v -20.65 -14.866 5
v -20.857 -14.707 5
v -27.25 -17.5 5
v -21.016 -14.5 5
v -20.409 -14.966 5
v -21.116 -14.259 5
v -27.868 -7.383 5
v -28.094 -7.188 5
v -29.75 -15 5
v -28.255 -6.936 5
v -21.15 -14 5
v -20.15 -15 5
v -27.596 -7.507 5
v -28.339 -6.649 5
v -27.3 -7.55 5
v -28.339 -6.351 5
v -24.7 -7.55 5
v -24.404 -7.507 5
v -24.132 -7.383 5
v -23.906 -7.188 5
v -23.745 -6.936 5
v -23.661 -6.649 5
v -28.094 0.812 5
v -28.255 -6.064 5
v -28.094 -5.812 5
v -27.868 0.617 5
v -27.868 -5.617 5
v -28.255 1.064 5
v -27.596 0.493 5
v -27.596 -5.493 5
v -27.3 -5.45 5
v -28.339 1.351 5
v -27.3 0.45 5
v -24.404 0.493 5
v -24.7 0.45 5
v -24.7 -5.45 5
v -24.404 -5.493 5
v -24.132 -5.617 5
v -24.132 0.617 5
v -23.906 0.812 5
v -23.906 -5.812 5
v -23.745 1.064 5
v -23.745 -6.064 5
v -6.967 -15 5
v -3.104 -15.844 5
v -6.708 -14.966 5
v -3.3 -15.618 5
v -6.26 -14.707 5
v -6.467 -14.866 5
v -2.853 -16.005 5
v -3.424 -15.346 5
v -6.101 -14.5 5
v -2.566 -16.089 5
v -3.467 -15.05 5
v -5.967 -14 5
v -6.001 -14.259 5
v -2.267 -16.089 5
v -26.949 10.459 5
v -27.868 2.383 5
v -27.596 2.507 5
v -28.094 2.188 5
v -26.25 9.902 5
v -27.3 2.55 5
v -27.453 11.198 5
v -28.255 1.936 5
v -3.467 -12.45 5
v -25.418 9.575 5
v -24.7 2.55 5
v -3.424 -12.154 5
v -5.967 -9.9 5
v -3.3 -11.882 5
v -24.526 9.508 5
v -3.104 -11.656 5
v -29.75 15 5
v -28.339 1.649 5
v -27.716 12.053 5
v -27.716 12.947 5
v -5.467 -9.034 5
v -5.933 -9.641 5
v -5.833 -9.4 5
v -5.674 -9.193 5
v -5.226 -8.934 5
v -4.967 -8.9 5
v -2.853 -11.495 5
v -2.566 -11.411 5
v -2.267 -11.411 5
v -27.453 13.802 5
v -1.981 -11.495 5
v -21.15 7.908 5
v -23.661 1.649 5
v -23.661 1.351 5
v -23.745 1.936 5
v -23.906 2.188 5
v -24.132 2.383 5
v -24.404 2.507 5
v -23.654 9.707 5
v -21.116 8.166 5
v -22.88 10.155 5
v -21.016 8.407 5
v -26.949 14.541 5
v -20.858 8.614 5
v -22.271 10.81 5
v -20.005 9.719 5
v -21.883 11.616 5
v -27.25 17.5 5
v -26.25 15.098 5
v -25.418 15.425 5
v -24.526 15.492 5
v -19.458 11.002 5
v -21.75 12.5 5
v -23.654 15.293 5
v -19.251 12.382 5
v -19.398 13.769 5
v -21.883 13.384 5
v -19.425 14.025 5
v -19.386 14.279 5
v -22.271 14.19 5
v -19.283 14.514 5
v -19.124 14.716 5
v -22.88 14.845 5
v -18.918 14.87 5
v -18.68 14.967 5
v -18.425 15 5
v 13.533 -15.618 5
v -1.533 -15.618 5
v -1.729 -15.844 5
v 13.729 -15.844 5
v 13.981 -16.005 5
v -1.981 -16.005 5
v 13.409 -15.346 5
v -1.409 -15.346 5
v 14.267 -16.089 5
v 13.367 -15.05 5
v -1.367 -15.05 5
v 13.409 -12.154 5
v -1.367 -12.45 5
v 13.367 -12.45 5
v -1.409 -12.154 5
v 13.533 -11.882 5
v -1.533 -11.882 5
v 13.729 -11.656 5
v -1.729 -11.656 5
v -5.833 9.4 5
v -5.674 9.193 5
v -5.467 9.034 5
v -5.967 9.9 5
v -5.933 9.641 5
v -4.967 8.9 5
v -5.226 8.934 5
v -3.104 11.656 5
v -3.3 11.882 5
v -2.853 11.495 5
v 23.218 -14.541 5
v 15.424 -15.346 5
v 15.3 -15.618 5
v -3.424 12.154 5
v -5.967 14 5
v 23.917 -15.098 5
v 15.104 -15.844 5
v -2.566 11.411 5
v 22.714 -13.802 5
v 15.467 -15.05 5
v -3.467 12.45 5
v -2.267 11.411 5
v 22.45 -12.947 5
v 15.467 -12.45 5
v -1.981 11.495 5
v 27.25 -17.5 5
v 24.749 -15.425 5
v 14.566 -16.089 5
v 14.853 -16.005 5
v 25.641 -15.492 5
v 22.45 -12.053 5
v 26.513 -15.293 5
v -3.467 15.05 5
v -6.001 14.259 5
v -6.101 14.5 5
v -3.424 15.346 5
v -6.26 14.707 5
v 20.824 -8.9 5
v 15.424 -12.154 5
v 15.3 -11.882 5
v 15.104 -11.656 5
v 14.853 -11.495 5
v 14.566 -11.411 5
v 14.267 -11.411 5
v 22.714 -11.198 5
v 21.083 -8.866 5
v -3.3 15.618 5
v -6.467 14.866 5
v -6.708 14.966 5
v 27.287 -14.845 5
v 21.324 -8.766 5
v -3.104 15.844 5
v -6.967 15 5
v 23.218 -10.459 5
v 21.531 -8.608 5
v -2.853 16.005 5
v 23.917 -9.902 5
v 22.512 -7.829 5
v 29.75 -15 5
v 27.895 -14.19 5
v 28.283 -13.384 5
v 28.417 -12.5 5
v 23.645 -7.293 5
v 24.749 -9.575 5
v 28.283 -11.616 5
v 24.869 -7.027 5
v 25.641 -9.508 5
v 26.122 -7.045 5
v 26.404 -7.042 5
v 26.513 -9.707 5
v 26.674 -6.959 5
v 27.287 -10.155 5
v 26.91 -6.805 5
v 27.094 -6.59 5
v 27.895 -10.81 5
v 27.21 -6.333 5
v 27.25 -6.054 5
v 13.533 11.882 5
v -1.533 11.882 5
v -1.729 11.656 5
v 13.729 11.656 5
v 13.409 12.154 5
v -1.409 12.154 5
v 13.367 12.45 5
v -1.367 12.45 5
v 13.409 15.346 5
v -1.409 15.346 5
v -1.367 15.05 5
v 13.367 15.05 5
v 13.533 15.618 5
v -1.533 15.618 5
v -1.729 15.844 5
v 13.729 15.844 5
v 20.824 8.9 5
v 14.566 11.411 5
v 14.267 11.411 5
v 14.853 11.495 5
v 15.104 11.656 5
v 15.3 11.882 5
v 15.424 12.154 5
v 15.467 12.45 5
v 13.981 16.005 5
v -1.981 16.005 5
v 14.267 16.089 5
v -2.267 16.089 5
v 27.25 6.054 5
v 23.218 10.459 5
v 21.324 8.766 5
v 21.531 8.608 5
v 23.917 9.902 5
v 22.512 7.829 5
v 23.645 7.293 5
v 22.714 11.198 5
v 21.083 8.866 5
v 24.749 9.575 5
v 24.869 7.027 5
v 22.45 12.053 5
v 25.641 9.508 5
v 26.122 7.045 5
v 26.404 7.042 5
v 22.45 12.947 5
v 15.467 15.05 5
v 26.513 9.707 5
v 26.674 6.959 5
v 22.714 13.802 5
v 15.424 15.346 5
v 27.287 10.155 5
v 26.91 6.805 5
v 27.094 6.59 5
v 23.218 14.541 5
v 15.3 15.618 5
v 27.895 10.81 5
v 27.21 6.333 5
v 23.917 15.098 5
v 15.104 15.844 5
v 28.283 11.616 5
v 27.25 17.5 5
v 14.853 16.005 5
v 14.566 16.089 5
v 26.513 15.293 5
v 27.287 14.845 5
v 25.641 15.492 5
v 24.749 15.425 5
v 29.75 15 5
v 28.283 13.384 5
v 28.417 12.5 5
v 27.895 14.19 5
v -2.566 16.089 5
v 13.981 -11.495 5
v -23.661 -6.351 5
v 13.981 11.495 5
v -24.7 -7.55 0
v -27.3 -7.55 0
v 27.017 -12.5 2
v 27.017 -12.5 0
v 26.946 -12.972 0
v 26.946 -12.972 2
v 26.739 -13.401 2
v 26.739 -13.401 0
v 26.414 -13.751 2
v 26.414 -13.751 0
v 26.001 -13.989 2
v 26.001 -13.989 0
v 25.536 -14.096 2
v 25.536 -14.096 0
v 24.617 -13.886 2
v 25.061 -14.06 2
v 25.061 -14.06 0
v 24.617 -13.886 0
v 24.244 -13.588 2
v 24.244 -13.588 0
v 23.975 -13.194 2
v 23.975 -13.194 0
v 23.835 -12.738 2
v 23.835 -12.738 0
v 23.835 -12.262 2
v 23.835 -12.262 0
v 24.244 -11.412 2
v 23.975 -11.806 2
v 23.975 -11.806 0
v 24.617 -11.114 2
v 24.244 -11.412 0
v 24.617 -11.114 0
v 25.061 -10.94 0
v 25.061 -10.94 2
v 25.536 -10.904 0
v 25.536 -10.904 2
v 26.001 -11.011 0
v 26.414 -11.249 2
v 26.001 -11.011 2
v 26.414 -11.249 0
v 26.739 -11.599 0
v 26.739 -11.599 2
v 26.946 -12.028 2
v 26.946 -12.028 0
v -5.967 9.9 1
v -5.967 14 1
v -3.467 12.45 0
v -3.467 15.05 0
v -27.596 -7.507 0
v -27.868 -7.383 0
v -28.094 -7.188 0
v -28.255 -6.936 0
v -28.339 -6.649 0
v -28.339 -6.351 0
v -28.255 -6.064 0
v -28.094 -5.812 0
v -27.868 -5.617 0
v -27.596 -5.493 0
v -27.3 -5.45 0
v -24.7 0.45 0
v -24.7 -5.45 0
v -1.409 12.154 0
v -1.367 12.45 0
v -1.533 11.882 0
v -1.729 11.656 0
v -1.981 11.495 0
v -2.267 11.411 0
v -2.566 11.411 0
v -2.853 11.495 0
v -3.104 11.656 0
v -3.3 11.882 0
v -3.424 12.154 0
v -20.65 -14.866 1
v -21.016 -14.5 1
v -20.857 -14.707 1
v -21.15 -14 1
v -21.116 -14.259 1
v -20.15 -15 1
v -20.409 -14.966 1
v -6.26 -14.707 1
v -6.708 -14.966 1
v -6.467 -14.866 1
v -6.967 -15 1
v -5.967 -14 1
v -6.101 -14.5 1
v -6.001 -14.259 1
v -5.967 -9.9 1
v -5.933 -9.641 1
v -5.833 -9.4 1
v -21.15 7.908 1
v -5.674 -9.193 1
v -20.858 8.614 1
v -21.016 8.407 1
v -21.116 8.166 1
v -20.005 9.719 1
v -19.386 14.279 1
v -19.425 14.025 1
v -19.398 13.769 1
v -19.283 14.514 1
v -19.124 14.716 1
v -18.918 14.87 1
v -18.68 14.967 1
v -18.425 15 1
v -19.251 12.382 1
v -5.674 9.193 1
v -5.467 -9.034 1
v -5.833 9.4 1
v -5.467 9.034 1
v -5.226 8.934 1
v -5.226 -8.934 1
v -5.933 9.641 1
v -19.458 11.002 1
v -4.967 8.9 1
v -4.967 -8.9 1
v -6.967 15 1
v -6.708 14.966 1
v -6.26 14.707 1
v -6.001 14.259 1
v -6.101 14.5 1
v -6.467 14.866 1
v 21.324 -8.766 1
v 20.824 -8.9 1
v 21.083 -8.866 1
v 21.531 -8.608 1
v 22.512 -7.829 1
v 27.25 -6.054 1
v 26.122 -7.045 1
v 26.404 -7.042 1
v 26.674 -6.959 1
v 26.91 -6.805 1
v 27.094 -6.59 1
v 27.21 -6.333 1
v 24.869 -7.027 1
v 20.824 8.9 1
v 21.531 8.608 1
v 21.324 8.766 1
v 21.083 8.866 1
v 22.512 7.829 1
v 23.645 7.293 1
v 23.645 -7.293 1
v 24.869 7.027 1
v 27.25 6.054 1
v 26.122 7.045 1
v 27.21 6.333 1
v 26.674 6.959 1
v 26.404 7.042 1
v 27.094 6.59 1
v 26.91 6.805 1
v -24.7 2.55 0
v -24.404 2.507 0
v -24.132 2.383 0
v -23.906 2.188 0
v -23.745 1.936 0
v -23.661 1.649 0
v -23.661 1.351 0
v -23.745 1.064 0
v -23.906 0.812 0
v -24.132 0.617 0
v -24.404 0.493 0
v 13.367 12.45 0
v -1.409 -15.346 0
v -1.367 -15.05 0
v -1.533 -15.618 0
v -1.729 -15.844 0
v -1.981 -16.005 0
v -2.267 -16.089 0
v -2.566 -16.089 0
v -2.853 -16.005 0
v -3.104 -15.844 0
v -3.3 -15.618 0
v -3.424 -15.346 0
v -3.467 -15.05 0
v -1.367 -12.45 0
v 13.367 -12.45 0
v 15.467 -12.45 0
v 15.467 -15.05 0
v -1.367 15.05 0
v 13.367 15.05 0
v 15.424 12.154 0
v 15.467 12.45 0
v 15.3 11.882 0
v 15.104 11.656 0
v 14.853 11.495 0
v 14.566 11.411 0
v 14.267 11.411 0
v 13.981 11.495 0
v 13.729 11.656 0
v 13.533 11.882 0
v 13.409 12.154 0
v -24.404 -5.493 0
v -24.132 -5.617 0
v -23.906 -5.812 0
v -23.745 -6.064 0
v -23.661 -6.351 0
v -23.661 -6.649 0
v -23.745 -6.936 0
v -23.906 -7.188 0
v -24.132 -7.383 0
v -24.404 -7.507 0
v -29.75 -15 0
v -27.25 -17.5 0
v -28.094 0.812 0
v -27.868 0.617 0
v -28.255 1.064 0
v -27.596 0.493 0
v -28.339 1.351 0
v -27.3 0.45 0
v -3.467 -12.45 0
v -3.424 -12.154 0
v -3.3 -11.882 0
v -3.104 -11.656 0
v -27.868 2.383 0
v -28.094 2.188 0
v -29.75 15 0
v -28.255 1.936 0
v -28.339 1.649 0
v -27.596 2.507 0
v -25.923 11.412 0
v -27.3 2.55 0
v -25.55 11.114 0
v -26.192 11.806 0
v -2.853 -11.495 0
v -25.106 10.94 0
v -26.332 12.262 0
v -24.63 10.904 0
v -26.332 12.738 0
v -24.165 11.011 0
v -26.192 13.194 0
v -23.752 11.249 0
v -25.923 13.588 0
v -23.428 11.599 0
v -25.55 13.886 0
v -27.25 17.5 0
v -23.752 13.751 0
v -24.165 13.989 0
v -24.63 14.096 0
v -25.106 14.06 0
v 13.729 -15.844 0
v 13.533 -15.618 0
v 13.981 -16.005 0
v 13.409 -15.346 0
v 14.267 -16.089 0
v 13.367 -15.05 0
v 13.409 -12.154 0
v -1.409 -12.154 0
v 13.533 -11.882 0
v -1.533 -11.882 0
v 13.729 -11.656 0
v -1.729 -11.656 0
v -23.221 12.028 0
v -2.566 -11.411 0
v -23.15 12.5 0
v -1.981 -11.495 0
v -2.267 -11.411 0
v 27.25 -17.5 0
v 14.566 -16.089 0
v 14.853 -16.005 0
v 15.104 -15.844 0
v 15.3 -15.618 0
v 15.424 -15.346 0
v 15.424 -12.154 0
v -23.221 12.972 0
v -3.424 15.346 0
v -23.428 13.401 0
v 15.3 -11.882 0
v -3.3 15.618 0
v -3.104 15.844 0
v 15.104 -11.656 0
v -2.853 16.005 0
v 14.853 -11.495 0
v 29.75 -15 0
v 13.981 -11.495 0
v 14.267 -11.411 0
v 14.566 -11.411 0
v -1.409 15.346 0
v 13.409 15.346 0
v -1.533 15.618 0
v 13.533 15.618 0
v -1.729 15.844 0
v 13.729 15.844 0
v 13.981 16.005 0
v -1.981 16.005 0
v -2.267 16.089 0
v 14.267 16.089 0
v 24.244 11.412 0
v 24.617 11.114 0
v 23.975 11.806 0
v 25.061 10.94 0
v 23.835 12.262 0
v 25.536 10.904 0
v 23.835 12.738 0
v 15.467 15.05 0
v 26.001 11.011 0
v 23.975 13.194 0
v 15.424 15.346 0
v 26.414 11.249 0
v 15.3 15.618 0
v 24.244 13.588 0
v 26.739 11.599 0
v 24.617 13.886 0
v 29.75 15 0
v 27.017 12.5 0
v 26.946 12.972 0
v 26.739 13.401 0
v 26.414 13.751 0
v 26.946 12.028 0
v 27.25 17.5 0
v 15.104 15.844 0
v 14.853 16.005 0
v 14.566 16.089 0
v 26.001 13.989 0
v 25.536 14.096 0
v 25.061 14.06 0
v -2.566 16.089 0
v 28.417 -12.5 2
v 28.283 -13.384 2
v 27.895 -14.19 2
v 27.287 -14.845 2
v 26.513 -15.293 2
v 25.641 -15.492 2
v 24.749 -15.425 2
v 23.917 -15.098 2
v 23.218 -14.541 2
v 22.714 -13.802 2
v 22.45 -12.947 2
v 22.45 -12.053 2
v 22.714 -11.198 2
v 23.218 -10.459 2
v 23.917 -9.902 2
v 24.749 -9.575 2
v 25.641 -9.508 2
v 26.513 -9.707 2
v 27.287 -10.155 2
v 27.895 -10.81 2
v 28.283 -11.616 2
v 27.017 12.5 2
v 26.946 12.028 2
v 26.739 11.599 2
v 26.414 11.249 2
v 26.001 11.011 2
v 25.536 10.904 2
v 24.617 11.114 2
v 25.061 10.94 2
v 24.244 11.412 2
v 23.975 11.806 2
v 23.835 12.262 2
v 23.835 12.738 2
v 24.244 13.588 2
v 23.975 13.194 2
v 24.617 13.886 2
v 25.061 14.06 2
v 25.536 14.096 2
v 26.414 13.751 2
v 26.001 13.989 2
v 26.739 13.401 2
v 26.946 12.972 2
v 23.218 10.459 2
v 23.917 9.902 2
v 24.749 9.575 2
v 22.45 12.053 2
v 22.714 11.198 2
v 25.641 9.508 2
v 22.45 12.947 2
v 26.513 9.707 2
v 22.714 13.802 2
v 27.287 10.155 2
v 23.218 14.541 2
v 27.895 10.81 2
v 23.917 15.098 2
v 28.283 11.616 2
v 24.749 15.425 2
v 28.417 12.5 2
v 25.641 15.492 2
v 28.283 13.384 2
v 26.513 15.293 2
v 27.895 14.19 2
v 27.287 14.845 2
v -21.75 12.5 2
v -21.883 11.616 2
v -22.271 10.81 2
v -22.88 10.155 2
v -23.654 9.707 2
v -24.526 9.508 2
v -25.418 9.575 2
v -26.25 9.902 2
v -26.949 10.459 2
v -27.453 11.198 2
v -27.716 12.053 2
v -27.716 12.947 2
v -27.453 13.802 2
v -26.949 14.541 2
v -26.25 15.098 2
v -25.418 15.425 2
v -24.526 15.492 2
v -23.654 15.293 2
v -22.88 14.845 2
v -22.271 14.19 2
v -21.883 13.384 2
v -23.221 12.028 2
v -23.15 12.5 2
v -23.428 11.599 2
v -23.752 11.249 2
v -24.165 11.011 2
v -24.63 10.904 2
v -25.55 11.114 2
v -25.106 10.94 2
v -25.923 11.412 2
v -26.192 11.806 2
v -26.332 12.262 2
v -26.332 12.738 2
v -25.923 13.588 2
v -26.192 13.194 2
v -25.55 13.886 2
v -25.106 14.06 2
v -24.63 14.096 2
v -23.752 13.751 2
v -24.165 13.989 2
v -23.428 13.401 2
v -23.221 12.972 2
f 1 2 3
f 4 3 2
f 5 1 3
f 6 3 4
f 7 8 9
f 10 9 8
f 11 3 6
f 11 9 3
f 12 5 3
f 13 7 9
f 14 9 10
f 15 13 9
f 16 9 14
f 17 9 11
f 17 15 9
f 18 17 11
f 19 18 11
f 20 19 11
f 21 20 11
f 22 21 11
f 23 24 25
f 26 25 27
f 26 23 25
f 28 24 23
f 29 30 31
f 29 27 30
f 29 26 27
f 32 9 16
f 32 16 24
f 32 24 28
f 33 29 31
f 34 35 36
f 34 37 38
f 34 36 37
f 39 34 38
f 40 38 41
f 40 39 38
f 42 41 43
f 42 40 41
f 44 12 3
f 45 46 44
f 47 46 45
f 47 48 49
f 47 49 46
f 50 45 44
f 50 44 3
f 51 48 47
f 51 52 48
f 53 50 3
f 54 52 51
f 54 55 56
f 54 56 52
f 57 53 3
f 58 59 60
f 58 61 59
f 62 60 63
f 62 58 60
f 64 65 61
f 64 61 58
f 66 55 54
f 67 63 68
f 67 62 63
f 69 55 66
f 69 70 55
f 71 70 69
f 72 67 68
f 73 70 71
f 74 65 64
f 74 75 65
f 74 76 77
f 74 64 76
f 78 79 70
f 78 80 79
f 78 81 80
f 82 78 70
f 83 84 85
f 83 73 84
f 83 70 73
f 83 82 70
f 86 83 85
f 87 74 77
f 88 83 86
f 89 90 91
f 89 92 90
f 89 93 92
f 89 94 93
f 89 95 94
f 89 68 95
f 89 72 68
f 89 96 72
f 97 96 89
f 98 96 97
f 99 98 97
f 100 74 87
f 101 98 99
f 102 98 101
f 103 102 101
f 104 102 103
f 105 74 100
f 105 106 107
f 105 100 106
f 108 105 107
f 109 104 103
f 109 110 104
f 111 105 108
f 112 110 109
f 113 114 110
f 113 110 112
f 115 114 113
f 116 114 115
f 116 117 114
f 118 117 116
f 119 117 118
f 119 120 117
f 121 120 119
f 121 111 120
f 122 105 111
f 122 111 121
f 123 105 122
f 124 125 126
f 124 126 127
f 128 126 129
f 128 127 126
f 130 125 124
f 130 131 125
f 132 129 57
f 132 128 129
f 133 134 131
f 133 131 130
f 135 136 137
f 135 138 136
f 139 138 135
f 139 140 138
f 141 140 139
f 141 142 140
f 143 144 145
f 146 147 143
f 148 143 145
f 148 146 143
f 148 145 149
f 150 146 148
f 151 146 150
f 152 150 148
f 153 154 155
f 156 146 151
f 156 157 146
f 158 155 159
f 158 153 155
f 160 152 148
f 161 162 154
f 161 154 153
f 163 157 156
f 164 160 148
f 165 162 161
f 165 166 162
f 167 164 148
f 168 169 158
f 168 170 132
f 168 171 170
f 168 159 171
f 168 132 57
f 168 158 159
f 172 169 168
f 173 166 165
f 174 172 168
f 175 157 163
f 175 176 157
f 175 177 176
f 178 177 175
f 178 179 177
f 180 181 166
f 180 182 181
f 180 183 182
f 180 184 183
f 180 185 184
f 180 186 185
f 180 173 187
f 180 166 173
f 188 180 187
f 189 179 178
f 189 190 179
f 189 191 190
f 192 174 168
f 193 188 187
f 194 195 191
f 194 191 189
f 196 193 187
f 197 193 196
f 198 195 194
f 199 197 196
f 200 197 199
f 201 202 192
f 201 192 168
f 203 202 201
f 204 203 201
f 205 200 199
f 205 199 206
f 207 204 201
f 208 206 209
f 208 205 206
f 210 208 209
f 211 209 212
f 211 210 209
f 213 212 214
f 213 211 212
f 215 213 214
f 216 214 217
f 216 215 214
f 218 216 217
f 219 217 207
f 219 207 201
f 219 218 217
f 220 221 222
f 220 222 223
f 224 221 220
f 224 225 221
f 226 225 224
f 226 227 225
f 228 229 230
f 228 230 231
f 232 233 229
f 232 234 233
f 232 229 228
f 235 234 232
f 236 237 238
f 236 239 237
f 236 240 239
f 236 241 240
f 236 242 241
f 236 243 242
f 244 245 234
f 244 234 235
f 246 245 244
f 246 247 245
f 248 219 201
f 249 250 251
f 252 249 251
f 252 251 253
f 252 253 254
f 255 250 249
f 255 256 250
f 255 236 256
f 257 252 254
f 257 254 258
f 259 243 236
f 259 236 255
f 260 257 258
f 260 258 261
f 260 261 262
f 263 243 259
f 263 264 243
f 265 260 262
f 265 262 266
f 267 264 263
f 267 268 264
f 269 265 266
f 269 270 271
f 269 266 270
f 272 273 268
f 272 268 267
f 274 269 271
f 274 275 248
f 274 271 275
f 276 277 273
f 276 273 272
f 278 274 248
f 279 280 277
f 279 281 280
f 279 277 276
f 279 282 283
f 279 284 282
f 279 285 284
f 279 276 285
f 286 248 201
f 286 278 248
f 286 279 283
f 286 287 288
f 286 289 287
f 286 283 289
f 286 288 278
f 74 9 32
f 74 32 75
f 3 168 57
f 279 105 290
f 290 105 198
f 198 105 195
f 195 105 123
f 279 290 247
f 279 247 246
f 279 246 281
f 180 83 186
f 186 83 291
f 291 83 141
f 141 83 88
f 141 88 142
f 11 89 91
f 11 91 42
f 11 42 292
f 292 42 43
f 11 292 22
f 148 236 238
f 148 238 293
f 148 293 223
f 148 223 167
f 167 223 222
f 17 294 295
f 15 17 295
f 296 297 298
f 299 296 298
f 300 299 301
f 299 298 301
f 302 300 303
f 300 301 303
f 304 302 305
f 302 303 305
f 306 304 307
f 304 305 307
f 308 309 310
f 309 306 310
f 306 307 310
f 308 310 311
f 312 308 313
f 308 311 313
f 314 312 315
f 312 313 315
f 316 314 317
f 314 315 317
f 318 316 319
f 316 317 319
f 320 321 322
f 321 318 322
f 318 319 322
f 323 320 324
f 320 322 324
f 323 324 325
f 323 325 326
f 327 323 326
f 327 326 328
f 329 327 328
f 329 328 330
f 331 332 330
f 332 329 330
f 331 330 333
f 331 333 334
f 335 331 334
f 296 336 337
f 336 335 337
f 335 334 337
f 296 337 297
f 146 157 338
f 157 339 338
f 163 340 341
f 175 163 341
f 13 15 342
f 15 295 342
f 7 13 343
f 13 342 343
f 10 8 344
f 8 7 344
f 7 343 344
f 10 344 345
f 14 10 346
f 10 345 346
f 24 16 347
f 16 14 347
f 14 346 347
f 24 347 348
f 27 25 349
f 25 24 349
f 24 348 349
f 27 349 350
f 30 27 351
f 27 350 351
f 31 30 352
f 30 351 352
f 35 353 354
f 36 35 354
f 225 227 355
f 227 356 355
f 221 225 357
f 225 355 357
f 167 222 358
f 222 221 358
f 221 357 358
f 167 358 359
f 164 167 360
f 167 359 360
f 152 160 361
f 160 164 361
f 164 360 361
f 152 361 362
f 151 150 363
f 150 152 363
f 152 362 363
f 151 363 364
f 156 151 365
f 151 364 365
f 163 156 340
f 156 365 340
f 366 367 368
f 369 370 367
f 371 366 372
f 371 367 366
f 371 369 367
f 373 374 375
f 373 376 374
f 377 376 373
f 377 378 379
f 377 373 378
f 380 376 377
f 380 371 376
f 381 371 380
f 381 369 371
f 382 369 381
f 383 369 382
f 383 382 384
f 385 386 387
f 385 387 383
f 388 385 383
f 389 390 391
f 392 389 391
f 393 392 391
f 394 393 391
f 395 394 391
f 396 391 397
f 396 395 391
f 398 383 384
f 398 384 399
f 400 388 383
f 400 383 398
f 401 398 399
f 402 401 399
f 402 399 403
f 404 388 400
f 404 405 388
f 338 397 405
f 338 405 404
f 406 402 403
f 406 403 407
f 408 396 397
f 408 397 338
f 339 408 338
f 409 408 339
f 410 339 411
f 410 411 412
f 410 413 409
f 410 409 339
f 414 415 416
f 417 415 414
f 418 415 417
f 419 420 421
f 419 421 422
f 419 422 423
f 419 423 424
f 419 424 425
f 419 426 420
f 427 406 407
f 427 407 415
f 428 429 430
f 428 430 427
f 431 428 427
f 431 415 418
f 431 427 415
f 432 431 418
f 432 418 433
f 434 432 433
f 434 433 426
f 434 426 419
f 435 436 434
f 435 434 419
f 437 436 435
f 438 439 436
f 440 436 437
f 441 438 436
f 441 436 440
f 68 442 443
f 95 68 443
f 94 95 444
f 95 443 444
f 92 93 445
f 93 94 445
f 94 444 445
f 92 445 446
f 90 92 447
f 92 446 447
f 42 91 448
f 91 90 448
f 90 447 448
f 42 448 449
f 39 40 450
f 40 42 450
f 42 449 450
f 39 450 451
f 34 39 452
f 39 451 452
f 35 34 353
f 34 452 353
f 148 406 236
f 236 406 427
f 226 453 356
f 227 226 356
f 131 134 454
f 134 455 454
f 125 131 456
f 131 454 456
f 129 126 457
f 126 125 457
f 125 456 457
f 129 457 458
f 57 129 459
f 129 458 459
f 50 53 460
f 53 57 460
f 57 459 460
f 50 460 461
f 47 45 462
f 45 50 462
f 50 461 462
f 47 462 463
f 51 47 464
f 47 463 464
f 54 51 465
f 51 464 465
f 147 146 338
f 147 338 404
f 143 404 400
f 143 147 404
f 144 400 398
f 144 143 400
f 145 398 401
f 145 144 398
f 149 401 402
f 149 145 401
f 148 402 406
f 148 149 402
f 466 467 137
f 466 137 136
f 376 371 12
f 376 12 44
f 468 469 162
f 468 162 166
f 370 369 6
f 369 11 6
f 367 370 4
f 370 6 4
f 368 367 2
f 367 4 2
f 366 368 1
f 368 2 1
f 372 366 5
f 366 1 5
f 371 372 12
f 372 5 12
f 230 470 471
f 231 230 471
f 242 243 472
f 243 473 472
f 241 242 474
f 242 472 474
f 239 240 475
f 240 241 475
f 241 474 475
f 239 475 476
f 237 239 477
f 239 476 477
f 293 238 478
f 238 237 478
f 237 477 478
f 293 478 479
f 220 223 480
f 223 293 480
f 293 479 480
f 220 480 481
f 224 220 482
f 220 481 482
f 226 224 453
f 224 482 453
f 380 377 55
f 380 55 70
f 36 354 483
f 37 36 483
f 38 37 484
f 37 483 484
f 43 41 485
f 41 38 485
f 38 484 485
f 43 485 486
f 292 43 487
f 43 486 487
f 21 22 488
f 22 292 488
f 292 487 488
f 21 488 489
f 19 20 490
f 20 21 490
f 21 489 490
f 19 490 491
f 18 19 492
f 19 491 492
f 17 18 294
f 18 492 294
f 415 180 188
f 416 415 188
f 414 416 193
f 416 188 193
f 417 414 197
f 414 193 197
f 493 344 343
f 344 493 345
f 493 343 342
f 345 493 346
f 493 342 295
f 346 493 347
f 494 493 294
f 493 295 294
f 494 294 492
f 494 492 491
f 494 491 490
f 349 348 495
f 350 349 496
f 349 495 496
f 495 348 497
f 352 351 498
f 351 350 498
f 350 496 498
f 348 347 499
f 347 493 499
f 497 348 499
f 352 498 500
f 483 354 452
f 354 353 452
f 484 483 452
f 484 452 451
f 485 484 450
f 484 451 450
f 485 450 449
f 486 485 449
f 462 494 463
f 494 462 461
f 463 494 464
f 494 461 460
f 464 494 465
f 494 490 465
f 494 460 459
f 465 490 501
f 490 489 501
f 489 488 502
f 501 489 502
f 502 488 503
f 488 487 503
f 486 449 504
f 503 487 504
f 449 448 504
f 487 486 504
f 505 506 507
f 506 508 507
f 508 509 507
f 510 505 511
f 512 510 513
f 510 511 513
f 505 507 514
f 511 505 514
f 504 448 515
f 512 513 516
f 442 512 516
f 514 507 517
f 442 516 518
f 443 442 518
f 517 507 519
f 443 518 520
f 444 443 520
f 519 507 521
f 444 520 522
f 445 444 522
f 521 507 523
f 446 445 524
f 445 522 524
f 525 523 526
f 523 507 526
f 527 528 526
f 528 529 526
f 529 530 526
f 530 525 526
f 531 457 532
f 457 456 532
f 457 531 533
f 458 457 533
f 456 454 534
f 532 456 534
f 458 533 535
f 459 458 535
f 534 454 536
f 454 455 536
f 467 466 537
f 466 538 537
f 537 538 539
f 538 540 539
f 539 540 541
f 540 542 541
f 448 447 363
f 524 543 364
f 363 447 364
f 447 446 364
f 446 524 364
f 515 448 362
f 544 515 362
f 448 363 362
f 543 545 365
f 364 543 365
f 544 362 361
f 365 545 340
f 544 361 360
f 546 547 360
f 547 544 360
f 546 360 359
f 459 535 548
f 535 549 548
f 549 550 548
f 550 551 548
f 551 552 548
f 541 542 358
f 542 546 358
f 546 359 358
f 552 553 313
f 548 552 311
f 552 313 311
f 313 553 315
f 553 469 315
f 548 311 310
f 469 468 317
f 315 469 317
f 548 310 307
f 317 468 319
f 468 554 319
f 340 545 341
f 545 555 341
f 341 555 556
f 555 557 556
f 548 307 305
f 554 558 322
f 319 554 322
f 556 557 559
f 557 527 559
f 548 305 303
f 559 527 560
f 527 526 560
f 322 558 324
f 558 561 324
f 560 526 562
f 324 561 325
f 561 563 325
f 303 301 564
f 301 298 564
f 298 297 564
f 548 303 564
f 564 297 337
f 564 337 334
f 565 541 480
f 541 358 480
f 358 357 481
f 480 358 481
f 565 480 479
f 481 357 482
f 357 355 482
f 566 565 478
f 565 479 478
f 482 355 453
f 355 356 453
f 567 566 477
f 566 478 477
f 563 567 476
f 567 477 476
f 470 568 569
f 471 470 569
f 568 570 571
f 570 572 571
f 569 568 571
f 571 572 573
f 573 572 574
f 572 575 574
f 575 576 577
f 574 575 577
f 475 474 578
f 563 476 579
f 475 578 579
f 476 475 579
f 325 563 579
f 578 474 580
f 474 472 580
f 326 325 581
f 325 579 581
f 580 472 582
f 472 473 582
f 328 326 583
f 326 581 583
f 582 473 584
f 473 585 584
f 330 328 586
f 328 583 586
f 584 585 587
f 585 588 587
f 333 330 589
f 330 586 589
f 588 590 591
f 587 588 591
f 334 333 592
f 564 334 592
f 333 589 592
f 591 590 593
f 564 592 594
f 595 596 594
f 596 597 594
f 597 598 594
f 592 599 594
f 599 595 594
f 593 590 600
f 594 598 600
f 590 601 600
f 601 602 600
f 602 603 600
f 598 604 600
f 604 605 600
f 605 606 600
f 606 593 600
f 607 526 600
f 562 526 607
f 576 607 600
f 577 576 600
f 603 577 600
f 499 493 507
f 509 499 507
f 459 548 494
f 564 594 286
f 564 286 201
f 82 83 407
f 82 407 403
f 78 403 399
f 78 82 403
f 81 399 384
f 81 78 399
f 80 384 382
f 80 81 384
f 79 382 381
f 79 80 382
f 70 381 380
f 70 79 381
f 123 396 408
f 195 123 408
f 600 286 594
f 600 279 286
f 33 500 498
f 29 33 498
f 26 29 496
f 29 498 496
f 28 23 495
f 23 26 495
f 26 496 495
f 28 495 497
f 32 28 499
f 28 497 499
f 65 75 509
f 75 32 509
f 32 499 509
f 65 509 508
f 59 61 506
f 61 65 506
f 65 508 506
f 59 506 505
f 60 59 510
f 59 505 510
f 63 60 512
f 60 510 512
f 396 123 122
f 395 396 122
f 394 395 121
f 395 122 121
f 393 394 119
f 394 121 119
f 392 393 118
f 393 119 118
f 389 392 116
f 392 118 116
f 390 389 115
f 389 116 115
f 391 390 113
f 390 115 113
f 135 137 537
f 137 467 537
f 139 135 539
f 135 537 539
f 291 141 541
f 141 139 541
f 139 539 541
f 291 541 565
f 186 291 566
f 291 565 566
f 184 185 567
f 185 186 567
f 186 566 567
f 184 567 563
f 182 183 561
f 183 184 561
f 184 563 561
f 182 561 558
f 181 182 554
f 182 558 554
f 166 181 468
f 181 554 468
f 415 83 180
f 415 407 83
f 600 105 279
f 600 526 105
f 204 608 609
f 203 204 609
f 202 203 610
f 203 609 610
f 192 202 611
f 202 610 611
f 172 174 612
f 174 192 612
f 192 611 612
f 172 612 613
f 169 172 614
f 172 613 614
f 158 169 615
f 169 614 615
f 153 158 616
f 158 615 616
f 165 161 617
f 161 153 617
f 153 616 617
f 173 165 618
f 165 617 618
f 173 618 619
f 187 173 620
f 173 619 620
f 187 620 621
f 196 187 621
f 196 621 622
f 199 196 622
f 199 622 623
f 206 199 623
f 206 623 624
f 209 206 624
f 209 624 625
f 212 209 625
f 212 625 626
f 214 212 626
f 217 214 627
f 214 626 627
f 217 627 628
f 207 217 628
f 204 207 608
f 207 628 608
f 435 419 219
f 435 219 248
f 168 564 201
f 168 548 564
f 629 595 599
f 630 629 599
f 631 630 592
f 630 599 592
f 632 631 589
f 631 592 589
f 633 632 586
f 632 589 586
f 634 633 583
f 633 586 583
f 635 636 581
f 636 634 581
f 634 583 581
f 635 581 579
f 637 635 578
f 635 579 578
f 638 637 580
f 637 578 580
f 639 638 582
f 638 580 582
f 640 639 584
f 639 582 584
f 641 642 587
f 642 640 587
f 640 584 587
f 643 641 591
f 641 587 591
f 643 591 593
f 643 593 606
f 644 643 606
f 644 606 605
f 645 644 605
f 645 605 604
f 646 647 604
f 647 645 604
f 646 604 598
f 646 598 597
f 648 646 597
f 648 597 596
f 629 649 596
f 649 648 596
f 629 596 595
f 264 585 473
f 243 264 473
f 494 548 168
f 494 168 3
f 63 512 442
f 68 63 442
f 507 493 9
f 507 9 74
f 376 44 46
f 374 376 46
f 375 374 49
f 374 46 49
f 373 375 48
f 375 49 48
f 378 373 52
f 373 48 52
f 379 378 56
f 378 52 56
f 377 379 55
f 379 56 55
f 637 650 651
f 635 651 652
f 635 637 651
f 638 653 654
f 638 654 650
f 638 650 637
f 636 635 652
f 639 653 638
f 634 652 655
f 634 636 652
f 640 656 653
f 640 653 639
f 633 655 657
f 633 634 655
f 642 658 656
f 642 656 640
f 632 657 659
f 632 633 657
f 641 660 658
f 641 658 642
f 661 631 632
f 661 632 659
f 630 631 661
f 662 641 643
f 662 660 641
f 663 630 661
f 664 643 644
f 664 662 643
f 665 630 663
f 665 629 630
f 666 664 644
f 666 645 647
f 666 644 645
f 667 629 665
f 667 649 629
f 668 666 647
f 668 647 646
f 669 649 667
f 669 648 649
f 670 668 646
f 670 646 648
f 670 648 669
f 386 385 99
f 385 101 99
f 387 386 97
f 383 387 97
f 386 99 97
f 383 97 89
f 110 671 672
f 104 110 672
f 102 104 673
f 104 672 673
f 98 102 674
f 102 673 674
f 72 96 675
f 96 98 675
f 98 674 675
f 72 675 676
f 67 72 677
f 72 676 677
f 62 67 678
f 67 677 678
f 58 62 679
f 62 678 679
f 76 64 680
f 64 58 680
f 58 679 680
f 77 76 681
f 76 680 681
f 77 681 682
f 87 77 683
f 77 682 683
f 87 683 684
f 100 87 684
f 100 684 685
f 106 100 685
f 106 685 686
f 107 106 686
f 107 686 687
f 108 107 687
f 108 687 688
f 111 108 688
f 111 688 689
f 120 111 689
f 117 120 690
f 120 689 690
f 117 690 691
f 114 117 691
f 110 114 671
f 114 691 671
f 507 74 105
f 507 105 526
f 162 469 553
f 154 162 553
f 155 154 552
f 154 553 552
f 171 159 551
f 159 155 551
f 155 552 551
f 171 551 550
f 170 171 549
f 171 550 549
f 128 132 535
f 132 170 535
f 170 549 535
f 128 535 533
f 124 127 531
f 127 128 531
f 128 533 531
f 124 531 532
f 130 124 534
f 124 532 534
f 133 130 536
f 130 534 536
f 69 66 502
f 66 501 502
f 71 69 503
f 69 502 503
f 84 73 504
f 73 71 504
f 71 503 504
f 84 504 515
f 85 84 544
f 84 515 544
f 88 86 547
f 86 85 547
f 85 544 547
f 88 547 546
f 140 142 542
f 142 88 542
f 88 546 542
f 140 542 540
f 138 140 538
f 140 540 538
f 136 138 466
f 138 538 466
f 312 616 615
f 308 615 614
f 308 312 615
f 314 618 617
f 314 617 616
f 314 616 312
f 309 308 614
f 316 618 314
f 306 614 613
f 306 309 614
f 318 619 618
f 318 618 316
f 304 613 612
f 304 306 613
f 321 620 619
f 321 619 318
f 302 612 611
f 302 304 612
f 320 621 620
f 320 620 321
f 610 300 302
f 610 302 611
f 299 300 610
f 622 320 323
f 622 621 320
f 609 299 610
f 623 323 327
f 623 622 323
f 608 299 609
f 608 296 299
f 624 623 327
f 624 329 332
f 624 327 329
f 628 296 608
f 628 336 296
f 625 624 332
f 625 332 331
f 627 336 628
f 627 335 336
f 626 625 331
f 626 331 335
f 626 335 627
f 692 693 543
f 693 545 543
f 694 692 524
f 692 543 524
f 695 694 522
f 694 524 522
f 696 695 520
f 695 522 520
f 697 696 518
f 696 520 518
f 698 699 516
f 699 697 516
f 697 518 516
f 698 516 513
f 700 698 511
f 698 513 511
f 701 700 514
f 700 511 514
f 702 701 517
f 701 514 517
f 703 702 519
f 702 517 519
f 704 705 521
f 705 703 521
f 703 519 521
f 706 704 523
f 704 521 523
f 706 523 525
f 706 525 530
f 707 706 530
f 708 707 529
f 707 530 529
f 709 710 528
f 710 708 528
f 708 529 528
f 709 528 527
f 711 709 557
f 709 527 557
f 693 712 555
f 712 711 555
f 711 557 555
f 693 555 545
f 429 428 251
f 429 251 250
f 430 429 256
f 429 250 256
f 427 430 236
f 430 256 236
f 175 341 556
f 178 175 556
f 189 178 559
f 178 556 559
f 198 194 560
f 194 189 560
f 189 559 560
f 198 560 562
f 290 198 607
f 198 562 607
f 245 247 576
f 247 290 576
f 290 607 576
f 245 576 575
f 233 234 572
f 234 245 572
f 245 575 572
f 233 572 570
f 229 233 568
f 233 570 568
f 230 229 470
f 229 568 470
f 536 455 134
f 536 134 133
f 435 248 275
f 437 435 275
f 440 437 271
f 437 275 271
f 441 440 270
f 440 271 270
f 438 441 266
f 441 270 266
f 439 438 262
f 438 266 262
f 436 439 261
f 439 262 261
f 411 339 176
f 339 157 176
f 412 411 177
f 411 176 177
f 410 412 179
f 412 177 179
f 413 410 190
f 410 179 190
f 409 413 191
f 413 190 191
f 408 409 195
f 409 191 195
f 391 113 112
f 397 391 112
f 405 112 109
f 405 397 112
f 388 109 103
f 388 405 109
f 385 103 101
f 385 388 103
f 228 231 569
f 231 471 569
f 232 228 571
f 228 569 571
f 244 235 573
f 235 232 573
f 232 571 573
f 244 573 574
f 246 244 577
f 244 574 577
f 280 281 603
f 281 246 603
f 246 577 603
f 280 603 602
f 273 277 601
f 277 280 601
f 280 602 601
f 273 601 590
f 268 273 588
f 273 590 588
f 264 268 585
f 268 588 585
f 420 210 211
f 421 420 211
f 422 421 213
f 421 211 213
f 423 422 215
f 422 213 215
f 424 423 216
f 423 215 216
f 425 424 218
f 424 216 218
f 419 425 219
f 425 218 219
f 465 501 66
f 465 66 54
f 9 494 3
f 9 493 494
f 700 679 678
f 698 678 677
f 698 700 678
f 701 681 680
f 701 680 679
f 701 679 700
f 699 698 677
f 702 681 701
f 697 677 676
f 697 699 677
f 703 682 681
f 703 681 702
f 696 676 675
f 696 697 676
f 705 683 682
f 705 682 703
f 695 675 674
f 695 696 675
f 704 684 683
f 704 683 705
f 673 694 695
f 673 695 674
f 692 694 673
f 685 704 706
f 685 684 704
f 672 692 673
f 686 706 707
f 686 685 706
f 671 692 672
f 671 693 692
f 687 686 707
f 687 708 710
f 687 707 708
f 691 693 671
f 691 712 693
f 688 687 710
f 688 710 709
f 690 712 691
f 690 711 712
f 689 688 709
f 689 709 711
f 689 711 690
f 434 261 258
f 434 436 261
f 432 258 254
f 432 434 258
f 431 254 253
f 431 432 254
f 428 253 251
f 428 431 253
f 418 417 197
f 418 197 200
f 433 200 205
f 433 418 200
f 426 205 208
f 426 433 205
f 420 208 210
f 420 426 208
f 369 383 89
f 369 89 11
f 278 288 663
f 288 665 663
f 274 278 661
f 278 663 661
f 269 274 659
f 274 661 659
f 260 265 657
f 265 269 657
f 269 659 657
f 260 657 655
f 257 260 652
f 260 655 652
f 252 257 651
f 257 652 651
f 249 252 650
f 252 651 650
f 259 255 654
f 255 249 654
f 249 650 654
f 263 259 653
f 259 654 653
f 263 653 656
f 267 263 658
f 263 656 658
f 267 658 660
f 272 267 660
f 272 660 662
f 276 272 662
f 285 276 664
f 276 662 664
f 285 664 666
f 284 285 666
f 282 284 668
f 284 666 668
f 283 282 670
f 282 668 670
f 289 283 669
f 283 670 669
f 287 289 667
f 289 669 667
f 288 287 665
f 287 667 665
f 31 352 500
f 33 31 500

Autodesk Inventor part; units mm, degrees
ref_plane "YZ Plane" through (0, 0, 0) normal (1, 0, 0) x (0, 1, 0)
ref_plane "XZ Plane" through (0, 0, 0) normal (0, 1, 0) x (-1, 0, 0)
ref_plane "XY Plane" through (0, 0, 0) normal (0, 0, 1) x (1, 0, 0)
sketch "スケッチ1" plane through (0, 0, 0) normal (0, 0, 1) x (1, 0, 0)
  line L0 (29.75, 17.5) -> (29.75, -17.5)
  line L1 (29.75, -17.5) -> (-29.75, -17.5)
  line L2 (-29.75, -17.5) -> (-29.75, 17.5)
  line L3 (-29.75, 17.5) -> (29.75, -17.5) construction
  line L4 (29.75, 17.5) -> (-29.75, -17.5) construction
  line L5 (-3.4667, -15.05) -> (-1.3667, -15.05) construction
  line L6 (15.4667, -15.05) -> (15.4667, -12.45)
  line L7 (15.4667, -12.45) -> (13.3667, -12.45) construction
  line L8 (-3.4667, -12.45) -> (-3.4667, -15.05)
  line L9 (-3.4667, -15.05) -> (15.4667, -12.45) construction
  line L10 (15.4667, -15.05) -> (-3.4667, -12.45) construction
  line L11 (-3.4167, -12.5) -> (15.4167, -12.5) construction
  line L12 (15.4167, -12.5) -> (15.4167, -15) construction
  line L13 (15.4167, -15) -> (-3.4167, -15) construction
  line L14 (-3.4167, -15) -> (-3.4167, -12.5) construction
  line L15 (-3.4167, -12.5) -> (15.4167, -15) construction
  line L16 (15.4167, -12.5) -> (-3.4167, -15) construction
  arc A0 (-1.3667, -12.45) -> (-3.4667, -12.45) centre (-2.4167, -12.45) ccw
  line L17 (-3.4667, -13.75) -> (15.4667, -13.75) construction
  arc A1 (-3.4667, -15.05) -> (-1.3667, -15.05) centre (-2.4167, -15.05) ccw
  line L18 (-1.3667, -12.45) -> (-3.4667, -12.45) construction
  line L19 (-1.3667, -15.05) -> (13.3667, -15.05)
  line L20 (13.3667, -12.45) -> (-1.3667, -12.45)
  line L21 (13.3667, -15.05) -> (15.4667, -15.05) construction
  line L22 (-29.75, 17.5) -> (29.75, 17.5)
  line L23 (6, 17.5) -> (6, -17.5) construction
  line L24 (-29.75, 0) -> (29.75, 0) construction
  arc A2 (15.4667, -12.45) -> (13.3667, -12.45) centre (14.4167, -12.45) ccw
  arc A3 (13.3667, -15.05) -> (15.4667, -15.05) centre (14.4167, -15.05) ccw
  line L25 (-3.4667, 15.05) -> (-1.3667, 15.05) construction
  line L26 (15.4667, 15.05) -> (15.4667, 12.45)
  line L27 (15.4667, 12.45) -> (13.3667, 12.45) construction
  line L28 (-3.4667, 12.45) -> (-3.4667, 15.05)
  line L29 (-3.4667, 15.05) -> (15.4667, 12.45) construction
  line L30 (15.4667, 15.05) -> (-3.4667, 12.45) construction
  line L31 (-3.4167, 12.5) -> (15.4167, 12.5) construction
  line L32 (15.4167, 12.5) -> (15.4167, 15) construction
  line L33 (15.4167, 15) -> (-3.4167, 15) construction
  line L34 (-3.4167, 15) -> (-3.4167, 12.5) construction
  line L35 (-3.4167, 12.5) -> (15.4167, 15) construction
  line L36 (15.4167, 12.5) -> (-3.4167, 15) construction
  arc A4 (-3.4667, 12.45) -> (-1.3667, 12.45) centre (-2.4167, 12.45) ccw
  line L37 (-3.4667, 13.75) -> (15.4667, 13.75) construction
  arc A5 (-1.3667, 15.05) -> (-3.4667, 15.05) centre (-2.4167, 15.05) ccw
  line L38 (-1.3667, 12.45) -> (-3.4667, 12.45) construction
  line L39 (-1.3667, 15.05) -> (13.3667, 15.05)
  line L40 (13.3667, 12.45) -> (-1.3667, 12.45)
  line L41 (13.3667, 15.05) -> (15.4667, 15.05) construction
  arc A6 (15.4667, 15.05) -> (13.3667, 15.05) centre (14.4167, 15.05) ccw
  arc A7 (13.3667, 12.45) -> (15.4667, 12.45) centre (14.4167, 12.45) ccw
  circle A8 centre (25.4167, -12.5) radius 1.6
  circle A9 centre (25.4167, -12.5) radius 3
  circle A10 centre (25.4167, 12.5) radius 1.6
  circle A11 centre (25.4167, 12.5) radius 3
  circle A12 centre (-24.75, 12.5) radius 1.6
  circle A13 centre (-24.75, 12.5) radius 3
  line L42 (-5.9667, -15) -> (-5.9667, -8.9)
  line L43 (-5.9667, -8.9) -> (21.2585, -8.9)
  line L44 (27.25, -7.3146) -> (27.25, 7.3146)
  line L45 (-19.851, 15) -> (-5.9167, 15)
  arc A14 (-21.15, 8.3419) -> (-19.851, 15) centre (-24.75, 12.5) ccw
  line L46 (-27.25, 2.5) -> (-24.75, 2.5) construction
  line L47 (-24.75, 2.5) -> (-24.75, -7.5) construction
  line L48 (-24.75, -7.5) -> (-27.25, -7.5) construction
  line L49 (-27.25, -7.5) -> (-27.25, 2.5) construction
  line L50 (-27.25, 2.5) -> (-24.75, -7.5) construction
  line L51 (-24.75, 2.5) -> (-27.25, -7.5) construction
  line L52 (-27.3, 2.55) -> (-24.7, 2.55)
  line L53 (-24.7, 2.55) -> (-24.7, -7.55)
  line L54 (-24.7, -7.55) -> (-27.3, -7.55)
  line L55 (-27.3, -7.55) -> (-27.3, 2.55)
  line L56 (-27.3, 2.55) -> (-24.7, -7.55) construction
  line L57 (-24.7, 2.55) -> (-27.3, -7.55) construction
  arc A15 (-27.3, 2.55) -> (-27.3, 0.45) centre (-27.3, 1.5) ccw
  line L58 (-26, 2.55) -> (-26, -7.55) construction
  line L59 (-27.3, -2.5) -> (-24.7, -2.5) construction
  arc A16 (-24.7, 0.45) -> (-24.7, 2.55) centre (-24.7, 1.5) ccw
  arc A17 (-27.3, -5.45) -> (-27.3, -7.55) centre (-27.3, -6.5) ccw
  arc A18 (-24.7, -7.55) -> (-24.7, -5.45) centre (-24.7, -6.5) ccw
  line L60 (-21.15, 8.3419) -> (-21.15, -15)
  line L61 (-5.9667, 15) -> (-5.9667, 8.9)
  line L62 (-21.15, -15) -> (-5.9667, -15)
  arc A19 (27.25, -7.3146) -> (21.2585, -8.9) centre (25.4167, -12.5) ccw
  line L63 (-5.9667, 8.9) -> (21.2585, 8.9)
  arc A20 (21.2585, 8.9) -> (27.25, 7.3146) centre (25.4167, 12.5) ccw
  point P0 (0, 0)
  point P1 (6, -13.75)
  point P2 (6, -13.75)
  point P3 (6, -13.75)
  point P4 (6, 13.75)
  point P5 (6, 13.75)
  point P6 (6, 13.75)
  point P7 (-26, -2.5)
  point P8 (-27.3, -5.45)
  point P9 (-24.7, 0.45)
  point P10 (-24.7, -5.45)
  point P11 (-5.9667, 15)
  point P12 (27.25, 7.3146)
  dimension "d0" = 59.5
  dimension "d1" = 35
  dimension "d6" = 18.8333
  dimension "d7" = 0.05
  dimension "d8" = 0.05
  dimension "d9" = 1.05
  dimension "d26" = 35.75
  dimension "d27" = 5
  dimension "d31" = 3.2
  dimension "d32" = 6
  dimension "d33" = 5
  dimension "d34" = 10
  dimension "d39" = 5
  dimension "d40" = 5
  dimension "d41" = 3.2
  dimension "d42" = 6
  dimension "d43" = 2.5
  dimension "d50" = 2.5
  dimension "d51" = 2.5
  dimension "d54" = 2.5
  dimension "d56" = 2.5
  dimension "d60" = 1.05
  dimension "d61" = 0.05
  dimension "d62" = 0.05
  dimension "d63" = 2.5
  dimension "d64" = 2.5
  dimension "d65" = 10
  dimension "d68" = 2.5
  dimension "d71" = 2.5
  dimension "d75" = 10
  dimension "d76" = 2.5
  dimension "d77" = 2.5
extrude "押し出し1" add sketch "スケッチ1" along normal blind 5 contours L0 L1 L2 L22
extrude "押し出し2" add sketch "スケッチ1" along normal blind 2 contours A9 | A11 | A13
chamfer "面取り1" distance 2.5 angle 45 4 edges at (-29.75, 17.5, 2.5) (-29.75, -17.5, 2.5) (29.75, 17.5, 2.5) (29.75, -17.5, 2.5)
extrude "押し出し3" add sketch "スケッチ1" along normal blind 1 contours L62 L60 A14 L45 L61 L63 A20 L44 A19 L43 L42
fillet "フィレット1" radius 1 11 edges at (-19.851, 15, 3) (-21.15, 8.3419, 3) (-5.9667, -8.9, 3) (-5.9667, 15, 3) (-5.9667, -15, 3) (-21.15, -15, 3) (21.2585, 8.9, 3) (27.25, 7.3146, 3) (27.25, -7.3146, 3) (21.2585, -8.9, 3) (-5.9667, 8.9, 3)
equation "\"d6\" = d4"
equation "\"d8\" = d7"
equation "\"d41\" = d31"
equation "\"d42\" = d32"
equation "\"d50\" = d49"
equation "\"d60\" = d9"
equation "\"d61\" = d7"
equation "\"d62\" = d61"
equation "\"d4\" = 18.833333"
equation "\"d49\" = 2.5"
properties part number "Cockpit_vertical_frame_05" material "アセタール樹脂、黒"
